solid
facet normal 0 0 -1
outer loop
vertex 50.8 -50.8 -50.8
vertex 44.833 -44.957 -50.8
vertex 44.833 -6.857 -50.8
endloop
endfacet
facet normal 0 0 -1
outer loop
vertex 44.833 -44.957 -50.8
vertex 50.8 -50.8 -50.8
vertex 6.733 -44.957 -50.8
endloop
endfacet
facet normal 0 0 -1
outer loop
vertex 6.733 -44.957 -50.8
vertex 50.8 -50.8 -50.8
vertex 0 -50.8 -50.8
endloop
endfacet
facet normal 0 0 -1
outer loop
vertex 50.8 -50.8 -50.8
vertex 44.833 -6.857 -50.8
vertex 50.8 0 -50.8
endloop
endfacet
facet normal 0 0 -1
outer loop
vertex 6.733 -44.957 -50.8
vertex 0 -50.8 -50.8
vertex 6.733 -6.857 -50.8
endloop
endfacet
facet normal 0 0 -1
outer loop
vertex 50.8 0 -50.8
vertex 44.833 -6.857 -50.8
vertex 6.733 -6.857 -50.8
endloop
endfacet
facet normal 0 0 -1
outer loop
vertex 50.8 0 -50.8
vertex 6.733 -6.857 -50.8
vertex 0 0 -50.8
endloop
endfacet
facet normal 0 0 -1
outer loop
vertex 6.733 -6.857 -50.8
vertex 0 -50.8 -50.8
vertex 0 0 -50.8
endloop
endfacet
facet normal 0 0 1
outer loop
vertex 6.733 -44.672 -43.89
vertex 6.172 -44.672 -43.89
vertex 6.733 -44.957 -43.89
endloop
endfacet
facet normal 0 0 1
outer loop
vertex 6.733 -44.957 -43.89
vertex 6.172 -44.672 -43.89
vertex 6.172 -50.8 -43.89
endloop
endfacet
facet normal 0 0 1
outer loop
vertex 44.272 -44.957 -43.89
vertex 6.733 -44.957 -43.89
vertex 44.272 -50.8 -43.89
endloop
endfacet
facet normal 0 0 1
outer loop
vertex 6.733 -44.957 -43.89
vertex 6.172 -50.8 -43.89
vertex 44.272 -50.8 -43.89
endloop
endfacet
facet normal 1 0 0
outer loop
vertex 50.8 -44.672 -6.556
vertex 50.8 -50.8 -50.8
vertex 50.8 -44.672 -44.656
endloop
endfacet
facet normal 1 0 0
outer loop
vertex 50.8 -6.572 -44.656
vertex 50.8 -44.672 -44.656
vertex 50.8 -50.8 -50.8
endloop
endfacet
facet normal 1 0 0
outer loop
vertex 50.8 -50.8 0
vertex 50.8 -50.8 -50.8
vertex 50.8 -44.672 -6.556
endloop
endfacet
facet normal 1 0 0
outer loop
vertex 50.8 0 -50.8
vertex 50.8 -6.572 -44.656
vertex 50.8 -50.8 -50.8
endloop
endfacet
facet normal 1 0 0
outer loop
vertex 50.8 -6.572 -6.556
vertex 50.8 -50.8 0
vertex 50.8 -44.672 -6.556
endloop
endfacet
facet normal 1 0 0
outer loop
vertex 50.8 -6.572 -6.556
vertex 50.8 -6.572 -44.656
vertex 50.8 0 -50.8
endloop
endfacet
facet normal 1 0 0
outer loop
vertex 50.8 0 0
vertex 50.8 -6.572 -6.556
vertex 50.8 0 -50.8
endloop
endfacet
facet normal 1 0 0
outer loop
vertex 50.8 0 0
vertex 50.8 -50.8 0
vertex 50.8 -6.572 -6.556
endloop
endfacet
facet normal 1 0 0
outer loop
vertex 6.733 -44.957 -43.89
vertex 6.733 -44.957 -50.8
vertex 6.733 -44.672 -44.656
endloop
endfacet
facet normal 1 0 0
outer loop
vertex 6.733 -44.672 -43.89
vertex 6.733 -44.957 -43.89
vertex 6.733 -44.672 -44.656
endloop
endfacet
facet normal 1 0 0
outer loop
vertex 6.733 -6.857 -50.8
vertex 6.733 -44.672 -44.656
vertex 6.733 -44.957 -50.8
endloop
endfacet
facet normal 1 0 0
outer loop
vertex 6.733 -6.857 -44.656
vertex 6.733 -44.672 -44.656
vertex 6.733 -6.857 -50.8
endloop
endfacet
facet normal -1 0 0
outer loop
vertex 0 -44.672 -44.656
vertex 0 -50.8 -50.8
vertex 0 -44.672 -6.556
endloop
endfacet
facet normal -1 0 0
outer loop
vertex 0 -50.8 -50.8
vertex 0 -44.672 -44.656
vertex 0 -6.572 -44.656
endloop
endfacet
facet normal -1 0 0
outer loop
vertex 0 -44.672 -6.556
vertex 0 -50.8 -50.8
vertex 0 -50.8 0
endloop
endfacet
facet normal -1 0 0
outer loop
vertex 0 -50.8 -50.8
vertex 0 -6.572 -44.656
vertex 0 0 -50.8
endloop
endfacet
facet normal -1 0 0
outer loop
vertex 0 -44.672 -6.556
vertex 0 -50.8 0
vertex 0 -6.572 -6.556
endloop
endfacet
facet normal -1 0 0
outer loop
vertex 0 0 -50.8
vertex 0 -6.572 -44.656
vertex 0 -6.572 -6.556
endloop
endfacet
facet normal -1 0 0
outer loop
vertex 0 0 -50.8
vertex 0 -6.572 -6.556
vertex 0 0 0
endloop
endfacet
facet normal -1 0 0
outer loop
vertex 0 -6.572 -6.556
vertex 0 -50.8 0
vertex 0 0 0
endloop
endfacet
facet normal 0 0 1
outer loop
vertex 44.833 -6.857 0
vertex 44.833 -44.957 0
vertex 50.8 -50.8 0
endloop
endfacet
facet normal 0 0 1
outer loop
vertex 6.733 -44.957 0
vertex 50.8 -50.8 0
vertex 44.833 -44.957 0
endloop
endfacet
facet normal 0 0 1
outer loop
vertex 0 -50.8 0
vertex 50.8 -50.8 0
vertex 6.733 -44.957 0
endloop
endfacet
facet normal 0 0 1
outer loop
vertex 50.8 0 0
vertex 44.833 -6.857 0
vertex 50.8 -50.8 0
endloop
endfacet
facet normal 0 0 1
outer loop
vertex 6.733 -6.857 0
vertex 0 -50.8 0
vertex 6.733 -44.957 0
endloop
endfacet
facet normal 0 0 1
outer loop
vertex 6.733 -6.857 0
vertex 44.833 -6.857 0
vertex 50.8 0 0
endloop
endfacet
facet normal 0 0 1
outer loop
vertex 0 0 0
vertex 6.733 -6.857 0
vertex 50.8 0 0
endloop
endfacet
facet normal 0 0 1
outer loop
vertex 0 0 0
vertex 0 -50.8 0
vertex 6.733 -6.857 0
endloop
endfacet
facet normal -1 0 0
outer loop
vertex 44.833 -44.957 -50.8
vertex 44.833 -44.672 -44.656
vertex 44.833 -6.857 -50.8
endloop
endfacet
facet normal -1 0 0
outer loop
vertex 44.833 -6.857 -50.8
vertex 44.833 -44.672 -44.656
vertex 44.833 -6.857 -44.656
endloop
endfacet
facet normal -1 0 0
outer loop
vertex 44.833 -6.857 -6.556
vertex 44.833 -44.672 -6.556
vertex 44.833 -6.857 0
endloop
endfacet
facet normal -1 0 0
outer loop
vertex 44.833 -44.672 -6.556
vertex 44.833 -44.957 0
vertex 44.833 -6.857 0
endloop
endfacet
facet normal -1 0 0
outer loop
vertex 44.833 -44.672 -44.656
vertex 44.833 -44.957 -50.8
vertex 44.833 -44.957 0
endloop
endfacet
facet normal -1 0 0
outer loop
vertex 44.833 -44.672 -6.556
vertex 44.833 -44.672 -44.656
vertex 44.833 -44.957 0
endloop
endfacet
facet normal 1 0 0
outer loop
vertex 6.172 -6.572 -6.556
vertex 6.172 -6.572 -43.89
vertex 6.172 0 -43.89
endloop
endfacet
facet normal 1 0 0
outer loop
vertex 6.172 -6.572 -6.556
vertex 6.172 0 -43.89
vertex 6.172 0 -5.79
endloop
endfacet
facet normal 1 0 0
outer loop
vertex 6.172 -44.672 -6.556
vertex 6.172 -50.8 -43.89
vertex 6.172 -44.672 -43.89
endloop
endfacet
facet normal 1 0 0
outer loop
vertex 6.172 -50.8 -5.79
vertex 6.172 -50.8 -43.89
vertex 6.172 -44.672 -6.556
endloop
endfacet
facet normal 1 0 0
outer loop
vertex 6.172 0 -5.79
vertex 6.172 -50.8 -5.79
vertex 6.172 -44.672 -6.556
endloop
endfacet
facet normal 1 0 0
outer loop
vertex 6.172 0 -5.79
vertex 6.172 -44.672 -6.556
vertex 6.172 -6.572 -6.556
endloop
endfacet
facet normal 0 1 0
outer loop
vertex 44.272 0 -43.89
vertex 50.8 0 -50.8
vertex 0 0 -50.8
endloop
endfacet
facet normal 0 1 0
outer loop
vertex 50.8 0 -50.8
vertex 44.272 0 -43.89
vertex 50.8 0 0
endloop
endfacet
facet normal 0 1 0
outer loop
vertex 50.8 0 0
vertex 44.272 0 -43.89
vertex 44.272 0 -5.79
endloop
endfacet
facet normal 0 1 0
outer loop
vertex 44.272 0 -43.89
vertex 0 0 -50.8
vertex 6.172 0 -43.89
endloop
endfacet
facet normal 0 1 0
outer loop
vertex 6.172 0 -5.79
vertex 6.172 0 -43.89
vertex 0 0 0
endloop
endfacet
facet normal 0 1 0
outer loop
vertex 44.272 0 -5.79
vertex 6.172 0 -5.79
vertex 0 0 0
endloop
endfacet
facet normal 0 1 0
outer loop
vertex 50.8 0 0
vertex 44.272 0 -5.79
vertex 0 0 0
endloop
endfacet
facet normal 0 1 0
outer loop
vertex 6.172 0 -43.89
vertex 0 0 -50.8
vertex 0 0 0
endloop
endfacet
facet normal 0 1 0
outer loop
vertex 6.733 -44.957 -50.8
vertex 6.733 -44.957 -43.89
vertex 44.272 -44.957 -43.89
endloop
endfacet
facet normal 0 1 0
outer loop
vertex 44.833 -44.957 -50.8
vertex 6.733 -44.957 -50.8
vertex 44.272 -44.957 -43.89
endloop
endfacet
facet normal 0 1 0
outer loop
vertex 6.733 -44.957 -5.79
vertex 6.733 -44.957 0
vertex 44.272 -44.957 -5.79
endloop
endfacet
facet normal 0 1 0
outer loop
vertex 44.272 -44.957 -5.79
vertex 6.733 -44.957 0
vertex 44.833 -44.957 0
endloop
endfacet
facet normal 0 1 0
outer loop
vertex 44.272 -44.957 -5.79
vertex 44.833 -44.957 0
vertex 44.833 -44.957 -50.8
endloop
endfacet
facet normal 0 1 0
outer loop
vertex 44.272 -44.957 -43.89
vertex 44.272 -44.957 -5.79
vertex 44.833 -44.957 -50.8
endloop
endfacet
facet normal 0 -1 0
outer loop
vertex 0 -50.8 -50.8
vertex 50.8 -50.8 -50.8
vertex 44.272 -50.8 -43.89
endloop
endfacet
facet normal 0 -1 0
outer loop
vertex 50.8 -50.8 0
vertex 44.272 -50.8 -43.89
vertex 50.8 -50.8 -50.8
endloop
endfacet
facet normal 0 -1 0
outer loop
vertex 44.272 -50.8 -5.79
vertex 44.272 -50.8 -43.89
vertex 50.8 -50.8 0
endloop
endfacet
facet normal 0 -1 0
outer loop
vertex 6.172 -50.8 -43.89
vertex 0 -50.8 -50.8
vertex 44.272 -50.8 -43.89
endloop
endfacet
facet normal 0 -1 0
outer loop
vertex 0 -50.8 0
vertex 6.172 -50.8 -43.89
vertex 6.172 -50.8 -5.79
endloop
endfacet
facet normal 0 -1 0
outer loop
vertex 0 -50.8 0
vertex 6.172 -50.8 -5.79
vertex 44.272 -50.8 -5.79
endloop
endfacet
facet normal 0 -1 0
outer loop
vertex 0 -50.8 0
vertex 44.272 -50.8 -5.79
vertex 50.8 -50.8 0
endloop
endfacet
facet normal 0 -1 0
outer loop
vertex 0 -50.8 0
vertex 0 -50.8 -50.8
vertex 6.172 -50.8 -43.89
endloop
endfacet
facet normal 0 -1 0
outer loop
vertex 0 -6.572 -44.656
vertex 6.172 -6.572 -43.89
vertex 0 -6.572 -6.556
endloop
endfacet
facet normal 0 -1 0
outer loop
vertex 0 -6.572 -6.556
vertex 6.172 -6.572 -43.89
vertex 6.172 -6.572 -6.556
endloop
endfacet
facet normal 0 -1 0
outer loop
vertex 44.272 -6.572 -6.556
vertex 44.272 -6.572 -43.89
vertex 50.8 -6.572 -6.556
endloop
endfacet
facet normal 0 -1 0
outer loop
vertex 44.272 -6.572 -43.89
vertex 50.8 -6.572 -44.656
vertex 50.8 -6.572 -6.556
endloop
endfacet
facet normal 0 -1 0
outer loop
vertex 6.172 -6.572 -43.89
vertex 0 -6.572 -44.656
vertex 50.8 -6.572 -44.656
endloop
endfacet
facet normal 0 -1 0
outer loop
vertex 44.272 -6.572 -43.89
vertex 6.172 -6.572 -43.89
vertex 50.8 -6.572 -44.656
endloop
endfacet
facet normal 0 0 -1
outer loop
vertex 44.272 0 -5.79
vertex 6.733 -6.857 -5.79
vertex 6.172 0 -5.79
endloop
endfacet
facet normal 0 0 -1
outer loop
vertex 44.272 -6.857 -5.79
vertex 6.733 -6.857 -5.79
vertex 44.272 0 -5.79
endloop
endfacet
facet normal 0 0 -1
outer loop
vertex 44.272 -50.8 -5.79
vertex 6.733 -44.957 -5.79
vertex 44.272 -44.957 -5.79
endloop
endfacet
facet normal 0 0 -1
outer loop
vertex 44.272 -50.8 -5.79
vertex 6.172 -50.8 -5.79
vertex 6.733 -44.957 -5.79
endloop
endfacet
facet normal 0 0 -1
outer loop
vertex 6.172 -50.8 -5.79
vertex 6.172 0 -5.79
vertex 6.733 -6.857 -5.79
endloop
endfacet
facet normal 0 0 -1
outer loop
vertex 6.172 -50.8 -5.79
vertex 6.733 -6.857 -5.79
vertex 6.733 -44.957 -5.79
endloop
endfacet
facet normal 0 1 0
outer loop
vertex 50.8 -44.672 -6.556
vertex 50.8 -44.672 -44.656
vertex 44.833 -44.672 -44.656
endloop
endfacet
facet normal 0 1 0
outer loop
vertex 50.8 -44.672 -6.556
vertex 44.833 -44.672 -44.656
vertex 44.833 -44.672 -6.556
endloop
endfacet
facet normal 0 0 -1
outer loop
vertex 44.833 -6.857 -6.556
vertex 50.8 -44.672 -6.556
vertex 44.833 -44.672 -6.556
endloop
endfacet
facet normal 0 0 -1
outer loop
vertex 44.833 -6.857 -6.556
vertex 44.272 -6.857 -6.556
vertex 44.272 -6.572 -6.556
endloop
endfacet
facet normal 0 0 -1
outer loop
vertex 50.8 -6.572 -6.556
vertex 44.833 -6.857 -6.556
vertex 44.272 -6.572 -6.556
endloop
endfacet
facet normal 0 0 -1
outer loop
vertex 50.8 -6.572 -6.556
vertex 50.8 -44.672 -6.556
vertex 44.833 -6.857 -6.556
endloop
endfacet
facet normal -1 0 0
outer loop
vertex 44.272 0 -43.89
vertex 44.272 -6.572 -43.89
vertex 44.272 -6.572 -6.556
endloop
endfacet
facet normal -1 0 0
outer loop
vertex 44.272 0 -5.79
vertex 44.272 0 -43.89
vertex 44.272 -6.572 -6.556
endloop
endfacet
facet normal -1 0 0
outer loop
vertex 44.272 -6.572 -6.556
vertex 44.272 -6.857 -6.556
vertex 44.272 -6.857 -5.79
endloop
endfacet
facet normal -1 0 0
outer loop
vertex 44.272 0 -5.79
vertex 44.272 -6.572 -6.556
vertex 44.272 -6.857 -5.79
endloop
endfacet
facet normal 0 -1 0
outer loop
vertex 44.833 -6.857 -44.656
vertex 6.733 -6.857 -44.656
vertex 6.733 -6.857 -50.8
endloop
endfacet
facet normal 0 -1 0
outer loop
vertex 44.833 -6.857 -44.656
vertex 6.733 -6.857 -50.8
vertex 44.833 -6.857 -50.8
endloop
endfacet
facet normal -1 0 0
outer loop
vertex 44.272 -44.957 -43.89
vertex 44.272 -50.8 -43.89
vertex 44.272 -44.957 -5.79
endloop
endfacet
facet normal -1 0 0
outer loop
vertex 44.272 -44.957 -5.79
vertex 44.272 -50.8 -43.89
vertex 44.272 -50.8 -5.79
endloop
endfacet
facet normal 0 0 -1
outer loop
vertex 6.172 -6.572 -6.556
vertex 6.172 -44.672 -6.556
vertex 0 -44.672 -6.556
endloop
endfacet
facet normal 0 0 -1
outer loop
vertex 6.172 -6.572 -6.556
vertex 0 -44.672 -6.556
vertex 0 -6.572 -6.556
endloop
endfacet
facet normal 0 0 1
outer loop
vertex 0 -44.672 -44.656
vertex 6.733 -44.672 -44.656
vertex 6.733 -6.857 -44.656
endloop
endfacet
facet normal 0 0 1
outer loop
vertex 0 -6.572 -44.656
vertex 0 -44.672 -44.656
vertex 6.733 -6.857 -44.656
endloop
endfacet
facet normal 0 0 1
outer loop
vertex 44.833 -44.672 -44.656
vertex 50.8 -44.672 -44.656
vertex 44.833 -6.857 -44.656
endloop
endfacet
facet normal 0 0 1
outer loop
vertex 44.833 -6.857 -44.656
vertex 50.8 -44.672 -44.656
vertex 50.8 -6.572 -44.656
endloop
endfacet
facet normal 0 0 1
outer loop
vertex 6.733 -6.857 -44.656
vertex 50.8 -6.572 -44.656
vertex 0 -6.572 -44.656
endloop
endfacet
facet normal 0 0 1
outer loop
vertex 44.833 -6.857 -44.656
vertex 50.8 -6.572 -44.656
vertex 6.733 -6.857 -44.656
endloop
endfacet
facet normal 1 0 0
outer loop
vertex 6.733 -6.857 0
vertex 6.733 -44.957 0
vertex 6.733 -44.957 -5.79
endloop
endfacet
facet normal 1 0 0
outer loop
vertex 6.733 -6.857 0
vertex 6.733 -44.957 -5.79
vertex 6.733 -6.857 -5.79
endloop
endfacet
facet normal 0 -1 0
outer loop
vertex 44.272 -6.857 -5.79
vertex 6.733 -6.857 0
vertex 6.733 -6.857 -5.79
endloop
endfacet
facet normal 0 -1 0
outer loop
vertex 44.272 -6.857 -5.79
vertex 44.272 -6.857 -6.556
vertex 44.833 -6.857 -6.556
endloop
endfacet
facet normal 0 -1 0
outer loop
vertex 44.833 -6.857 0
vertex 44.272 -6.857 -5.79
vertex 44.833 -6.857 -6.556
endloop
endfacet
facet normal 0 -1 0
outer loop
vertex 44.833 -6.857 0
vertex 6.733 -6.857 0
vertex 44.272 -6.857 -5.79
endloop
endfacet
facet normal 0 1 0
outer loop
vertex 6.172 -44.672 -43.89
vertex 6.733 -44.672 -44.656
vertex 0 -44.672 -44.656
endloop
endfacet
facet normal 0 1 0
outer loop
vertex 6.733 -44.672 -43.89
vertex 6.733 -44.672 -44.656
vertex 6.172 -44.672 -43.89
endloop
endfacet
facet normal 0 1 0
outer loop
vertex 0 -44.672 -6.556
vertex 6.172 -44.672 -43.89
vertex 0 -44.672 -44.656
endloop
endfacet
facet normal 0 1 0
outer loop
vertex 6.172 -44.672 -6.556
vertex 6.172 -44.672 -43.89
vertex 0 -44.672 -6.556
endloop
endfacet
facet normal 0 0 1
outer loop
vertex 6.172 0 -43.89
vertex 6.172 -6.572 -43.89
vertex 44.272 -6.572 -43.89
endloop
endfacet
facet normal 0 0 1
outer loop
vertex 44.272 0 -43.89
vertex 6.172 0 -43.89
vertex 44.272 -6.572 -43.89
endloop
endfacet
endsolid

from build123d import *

# Parameters (mm, degrees)
F0_W     = 50.8
F0_H     = 50.8
F1_DEPTH = 50.8
F2_W     = 38.1
F2_H     = 38.1
F3_DEPTH = 50.8
F4_W     = 38.1
F4_H     = 38.1
F5_DEPTH = 50.8
F6_W     = 38.1
F6_H     = 38.1
F7_DEPTH = 50.8


with BuildPart() as f1:
    # F0 (on Right) → F1 (new body)
    with BuildSketch(Plane.YZ):
        with Locations((-25.4, -25.4)):
            Rectangle(F0_W, F0_H)
    extrude(amount=F1_DEPTH)

    # F2 (on face) → F3 (cut)
    with BuildSketch(Plane.YZ.offset(50.8)):
        with Locations((-25.621607, -25.606393)):
            Rectangle(F2_W, F2_H)
    extrude(amount=-F3_DEPTH, mode=Mode.SUBTRACT)

    # F4 (on face) → F5 (cut)
    with BuildSketch(Plane.XZ.offset(50.8)):
        with Locations((25.222066, -24.840273)):
            Rectangle(F4_W, F4_H)
    extrude(amount=-F5_DEPTH, mode=Mode.SUBTRACT)

    # F6 (on face) → F7 (cut)
    with BuildSketch(Plane.XY):
        with Locations((25.782557, -25.907018)):
            Rectangle(F6_W, F6_H)
    extrude(amount=-F7_DEPTH, mode=Mode.SUBTRACT)


solid = f1.part
